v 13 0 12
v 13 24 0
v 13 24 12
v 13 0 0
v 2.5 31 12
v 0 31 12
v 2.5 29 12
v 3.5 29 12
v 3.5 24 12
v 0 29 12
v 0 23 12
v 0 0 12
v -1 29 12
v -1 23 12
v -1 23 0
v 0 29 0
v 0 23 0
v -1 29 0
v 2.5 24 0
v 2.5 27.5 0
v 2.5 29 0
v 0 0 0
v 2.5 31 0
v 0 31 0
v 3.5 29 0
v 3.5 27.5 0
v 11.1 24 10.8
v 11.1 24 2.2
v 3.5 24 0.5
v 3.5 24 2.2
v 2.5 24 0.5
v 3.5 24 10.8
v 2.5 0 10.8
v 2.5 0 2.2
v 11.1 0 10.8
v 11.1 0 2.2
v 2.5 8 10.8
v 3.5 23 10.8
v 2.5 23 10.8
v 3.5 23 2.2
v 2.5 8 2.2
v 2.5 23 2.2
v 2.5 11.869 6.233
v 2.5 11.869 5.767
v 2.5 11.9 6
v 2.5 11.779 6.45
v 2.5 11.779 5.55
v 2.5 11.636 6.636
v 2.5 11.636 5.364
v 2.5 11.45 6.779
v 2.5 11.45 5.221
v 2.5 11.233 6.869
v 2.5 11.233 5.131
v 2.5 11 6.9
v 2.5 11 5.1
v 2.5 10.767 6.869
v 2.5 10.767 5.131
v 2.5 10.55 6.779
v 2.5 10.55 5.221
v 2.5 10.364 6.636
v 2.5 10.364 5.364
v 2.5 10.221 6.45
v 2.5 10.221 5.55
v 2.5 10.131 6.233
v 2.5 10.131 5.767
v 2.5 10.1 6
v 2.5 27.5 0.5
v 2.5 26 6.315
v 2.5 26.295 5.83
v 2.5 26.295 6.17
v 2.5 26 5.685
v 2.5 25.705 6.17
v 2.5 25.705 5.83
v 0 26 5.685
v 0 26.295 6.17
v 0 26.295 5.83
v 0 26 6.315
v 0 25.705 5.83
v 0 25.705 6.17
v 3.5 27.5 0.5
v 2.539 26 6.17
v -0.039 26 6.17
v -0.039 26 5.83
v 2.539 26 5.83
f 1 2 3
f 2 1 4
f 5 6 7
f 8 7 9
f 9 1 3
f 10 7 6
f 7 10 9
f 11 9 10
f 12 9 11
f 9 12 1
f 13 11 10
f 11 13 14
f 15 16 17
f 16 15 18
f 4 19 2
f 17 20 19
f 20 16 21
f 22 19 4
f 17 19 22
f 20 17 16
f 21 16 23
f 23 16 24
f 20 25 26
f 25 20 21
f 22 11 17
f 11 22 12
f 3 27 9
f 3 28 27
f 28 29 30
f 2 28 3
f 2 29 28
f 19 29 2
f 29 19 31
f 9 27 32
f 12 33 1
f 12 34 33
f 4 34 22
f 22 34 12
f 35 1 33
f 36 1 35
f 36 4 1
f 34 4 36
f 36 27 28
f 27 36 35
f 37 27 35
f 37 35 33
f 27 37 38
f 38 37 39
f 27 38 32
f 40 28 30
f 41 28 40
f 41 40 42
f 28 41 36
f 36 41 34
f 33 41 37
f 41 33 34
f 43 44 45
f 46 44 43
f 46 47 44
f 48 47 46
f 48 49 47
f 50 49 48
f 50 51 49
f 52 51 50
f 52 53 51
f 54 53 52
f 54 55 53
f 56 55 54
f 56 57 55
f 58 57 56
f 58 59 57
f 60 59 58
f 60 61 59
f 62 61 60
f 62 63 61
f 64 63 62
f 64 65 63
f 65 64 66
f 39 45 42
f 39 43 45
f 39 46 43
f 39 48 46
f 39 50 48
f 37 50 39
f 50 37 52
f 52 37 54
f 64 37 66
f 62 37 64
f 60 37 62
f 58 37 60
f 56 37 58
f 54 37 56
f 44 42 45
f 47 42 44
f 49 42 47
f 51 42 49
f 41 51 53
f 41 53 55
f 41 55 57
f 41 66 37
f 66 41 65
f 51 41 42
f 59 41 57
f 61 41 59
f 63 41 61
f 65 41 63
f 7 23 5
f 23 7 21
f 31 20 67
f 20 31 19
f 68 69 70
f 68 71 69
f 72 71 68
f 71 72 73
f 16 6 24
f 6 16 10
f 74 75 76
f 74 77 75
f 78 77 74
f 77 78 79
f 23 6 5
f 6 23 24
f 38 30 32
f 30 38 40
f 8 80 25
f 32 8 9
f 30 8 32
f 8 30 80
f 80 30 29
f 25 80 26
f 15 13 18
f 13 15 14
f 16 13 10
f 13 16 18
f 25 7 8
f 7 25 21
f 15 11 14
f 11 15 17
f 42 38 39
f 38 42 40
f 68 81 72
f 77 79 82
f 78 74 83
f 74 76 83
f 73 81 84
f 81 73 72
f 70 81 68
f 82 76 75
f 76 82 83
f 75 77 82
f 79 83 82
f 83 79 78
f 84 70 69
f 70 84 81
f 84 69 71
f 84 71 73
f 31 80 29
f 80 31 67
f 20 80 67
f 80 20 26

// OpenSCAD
// Hot Wire Cutter Thermocouple Clip
// Snaps onto cutter frame bar, holds bead against cutting wire
// Units: mm — adjust frame_thickness and wire_offset for your cutter

// ── Measure your hot wire cutter ──
frame_thickness = 8;    // thickness of the frame bar the clip grabs
frame_width      = 20;   // width of the frame bar
wire_offset      = 15;   // distance from frame edge to hot wire
wire_diameter    = 0.5;  // hot wire thickness (nichrome)
bead_diameter    = 2.0;  // thermocouple bead size
probe_wire_dia   = 1.2;  // thermocouple cable thickness

// ── Design ──────────────────────────────────────────────
clip_wall      = 2.5;   // clip arm thickness
clip_depth     = frame_width + 4;
clip_height    = frame_thickness + 4;
tolerance      = 0.3;   // loose fit so it snaps on

module thermocouple_clip() {
    difference() {
        union() {
            // ── Frame clamp (C-shape) ──
            difference() {
                cube([clip_wall * 2 + frame_thickness, clip_depth, clip_height]);
                // cutout for frame bar
                translate([clip_wall, -1, clip_wall - tolerance])
                    cube([frame_thickness + tolerance*2, clip_depth + 2, frame_thickness + tolerance*2]);
            }
            
            // ── Arm reaching to the wire ──
            translate([0, clip_depth/2 - 4, 0]) {
                difference() {
                    // arm body
                    cube([clip_wall, wire_offset + bead_diameter + 6, clip_height]);
                    
                    // probe cable channel (along top of arm)
                    translate([-1, 3, clip_height/2])
                        rotate([0, 90, 0])
                            cylinder(r = probe_wire_dia/2 + 0.3, h = clip_wall + 2, $fn = 24);
                }
                
                // ── Bead holder at end of arm ──
                translate([0, wire_offset + 3, clip_height/2]) {
                    difference() {
                        // holder block
                        translate([-1, -3, -clip_height/2])
                            cube([clip_wall + 2, 6, clip_height]);
                        
                        // bead pocket
                        translate([clip_wall/2, 0, 0])
                            sphere(r = bead_diameter/2 + 0.3, $fn = 24);
                        
                        // wire groove (bottom, where hot wire passes)
                        translate([0, -bead_diameter/2 - 1, -clip_height/2 - 1])
                            cube([clip_wall + 2, bead_diameter + wire_diameter + 1, wire_diameter + 1]);
                        
                        // opening for wire to enter
                        translate([clip_wall/2 - 0.5, bead_diameter/2 - 1, -clip_height/2 - 1])
                            cube([1, 4, 4]);
                    }
                }
            }
        }
    }
}

// Render
thermocouple_clip();
